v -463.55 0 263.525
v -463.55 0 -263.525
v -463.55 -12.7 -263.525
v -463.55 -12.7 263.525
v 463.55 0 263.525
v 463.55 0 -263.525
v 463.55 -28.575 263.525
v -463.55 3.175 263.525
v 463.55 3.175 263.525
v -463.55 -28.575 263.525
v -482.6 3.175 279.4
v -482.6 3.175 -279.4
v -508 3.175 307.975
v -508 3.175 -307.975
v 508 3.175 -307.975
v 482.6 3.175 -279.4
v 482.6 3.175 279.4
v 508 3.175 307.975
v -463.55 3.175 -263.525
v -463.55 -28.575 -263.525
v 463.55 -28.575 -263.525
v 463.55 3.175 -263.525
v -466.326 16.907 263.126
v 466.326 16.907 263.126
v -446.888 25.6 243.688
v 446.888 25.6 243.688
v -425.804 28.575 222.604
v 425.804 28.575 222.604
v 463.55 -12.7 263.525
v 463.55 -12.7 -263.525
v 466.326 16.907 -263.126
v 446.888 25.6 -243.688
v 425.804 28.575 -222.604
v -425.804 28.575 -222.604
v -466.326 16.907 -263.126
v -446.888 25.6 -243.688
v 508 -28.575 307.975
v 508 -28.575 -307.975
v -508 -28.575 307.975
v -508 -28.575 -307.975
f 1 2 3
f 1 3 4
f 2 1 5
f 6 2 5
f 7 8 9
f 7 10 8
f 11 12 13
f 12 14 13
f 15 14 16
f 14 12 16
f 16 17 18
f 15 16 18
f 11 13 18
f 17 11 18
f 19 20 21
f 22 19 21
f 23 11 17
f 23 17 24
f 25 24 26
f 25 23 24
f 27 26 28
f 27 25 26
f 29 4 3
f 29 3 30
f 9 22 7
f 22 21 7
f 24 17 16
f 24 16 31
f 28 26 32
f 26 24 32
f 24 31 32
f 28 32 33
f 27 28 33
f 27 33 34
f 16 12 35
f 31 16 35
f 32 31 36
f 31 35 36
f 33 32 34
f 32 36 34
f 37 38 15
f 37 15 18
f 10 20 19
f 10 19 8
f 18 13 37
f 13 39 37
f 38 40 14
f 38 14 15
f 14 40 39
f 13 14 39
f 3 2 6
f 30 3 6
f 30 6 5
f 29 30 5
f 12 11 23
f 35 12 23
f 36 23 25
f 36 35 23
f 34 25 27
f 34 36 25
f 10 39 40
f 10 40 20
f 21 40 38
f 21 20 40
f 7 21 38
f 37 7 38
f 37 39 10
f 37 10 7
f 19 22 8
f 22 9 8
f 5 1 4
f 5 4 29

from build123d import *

# Parameters (mm, degrees)
F0_W        = 927.1
F0_H        = 527.05
F1_DEPTH    = 12.7
F2_W        = 1016
F2_H        = 615.95
F2_W_2      = 927.1
F2_H_2      = 527.05
F3_DEPTH    = 15.875
F4_W        = 965.2
F4_H        = 558.8
F5_DEPTH    = 25.4
F6_T1_DEPTH = 842.7806331425
F6_T3_DEPTH = 1249.1806331425


# Not quite as in the source:
# - a fillet or chamfer that OpenCascade refuses, or shapes differently, is made with other operations: its cross-section is extruded or revolved along the edge and cut away or added


with BuildPart() as f1:
    # F0 (on Front) → F1 (new body)
    with BuildSketch(Plane.XZ):
        Rectangle(F0_W, F0_H)
    extrude(amount=F1_DEPTH)


with BuildPart() as f3:
    # F2 (on face) → F3 (new body, symmetric)
    with BuildSketch(Plane.XZ.offset(12.7)):
        Rectangle(F2_W, F2_H)
        Rectangle(F2_W_2, F2_H_2, mode=Mode.SUBTRACT)
    extrude(amount=F3_DEPTH, both=True)

    # F4 (on face) → F5 (join)
    with BuildSketch(Plane(origin=(0, 3.175, 0), x_dir=(-1, 0, 0), z_dir=(0, 1, 0))):
        Rectangle(F4_W, F4_H)
    extrude(amount=F5_DEPTH)

    # F6: fillet of radius 76.2 on 4 edges, made by hand

    # F6_s2 → F6_t1 (cut)
    with BuildSketch(Plane.XY.offset(-421.3903165712)):
        with BuildLine():
            ThreePointArc((482.6, 3.175), (456.9123931049, 21.9357648032), (425.8038733715, 28.575))
            Line((425.8038733715, 28.575), (425.8038733715, 30.099))
            Line((425.8038733715, 30.099), (482.6, 30.099))
            Line((482.6, 30.099), (484.124, 28.575))
            ThreePointArc((484.124, 28.575), (484.124, 15.875), (483.7359225326, 4.191))
            Line((483.7359225326, 4.191), (482.6, 3.175))
        make_face()
        with BuildLine():
            ThreePointArc((-482.6, 3.175), (-456.9123931049, 21.9357648032), (-425.8038733715, 28.575))
            Line((-425.8038733715, 28.575), (-425.8038733715, 30.099))
            Line((-425.8038733715, 30.099), (-482.6, 30.099))
            Line((-482.6, 30.099), (-484.124, 28.575))
            ThreePointArc((-484.124, 28.575), (-484.124, 15.875), (-483.7359225326, 4.191))
            Line((-483.7359225326, 4.191), (-482.6, 3.175))
        make_face()
    extrude(amount=F6_T1_DEPTH, mode=Mode.SUBTRACT)

    # F6_s4 → F6_t3 (cut)
    with BuildSketch(Plane.YZ.offset(-624.5903165712)):
        with BuildLine():
            ThreePointArc((3.175, 279.4), (21.9357648032, 253.7123931049), (28.575, 222.6038733715))
            Line((28.575, 222.6038733715), (30.099, 222.6038733715))
            Line((30.099, 222.6038733715), (30.099, 279.4))
            Line((30.099, 279.4), (28.575, 280.924))
            ThreePointArc((28.575, 280.924), (15.875, 280.924), (4.191, 280.5359225326))
            Line((4.191, 280.5359225326), (3.175, 279.4))
        make_face()
        with BuildLine():
            ThreePointArc((3.175, -279.4), (21.9357648032, -253.7123931049), (28.575, -222.6038733715))
            Line((28.575, -222.6038733715), (30.099, -222.6038733715))
            Line((30.099, -222.6038733715), (30.099, -279.4))
            Line((30.099, -279.4), (28.575, -280.924))
            ThreePointArc((28.575, -280.924), (15.875, -280.924), (4.191, -280.5359225326))
            Line((4.191, -280.5359225326), (3.175, -279.4))
        make_face()
    extrude(amount=F6_T3_DEPTH, mode=Mode.SUBTRACT)


solid = Compound([f1.part, f3.part])
